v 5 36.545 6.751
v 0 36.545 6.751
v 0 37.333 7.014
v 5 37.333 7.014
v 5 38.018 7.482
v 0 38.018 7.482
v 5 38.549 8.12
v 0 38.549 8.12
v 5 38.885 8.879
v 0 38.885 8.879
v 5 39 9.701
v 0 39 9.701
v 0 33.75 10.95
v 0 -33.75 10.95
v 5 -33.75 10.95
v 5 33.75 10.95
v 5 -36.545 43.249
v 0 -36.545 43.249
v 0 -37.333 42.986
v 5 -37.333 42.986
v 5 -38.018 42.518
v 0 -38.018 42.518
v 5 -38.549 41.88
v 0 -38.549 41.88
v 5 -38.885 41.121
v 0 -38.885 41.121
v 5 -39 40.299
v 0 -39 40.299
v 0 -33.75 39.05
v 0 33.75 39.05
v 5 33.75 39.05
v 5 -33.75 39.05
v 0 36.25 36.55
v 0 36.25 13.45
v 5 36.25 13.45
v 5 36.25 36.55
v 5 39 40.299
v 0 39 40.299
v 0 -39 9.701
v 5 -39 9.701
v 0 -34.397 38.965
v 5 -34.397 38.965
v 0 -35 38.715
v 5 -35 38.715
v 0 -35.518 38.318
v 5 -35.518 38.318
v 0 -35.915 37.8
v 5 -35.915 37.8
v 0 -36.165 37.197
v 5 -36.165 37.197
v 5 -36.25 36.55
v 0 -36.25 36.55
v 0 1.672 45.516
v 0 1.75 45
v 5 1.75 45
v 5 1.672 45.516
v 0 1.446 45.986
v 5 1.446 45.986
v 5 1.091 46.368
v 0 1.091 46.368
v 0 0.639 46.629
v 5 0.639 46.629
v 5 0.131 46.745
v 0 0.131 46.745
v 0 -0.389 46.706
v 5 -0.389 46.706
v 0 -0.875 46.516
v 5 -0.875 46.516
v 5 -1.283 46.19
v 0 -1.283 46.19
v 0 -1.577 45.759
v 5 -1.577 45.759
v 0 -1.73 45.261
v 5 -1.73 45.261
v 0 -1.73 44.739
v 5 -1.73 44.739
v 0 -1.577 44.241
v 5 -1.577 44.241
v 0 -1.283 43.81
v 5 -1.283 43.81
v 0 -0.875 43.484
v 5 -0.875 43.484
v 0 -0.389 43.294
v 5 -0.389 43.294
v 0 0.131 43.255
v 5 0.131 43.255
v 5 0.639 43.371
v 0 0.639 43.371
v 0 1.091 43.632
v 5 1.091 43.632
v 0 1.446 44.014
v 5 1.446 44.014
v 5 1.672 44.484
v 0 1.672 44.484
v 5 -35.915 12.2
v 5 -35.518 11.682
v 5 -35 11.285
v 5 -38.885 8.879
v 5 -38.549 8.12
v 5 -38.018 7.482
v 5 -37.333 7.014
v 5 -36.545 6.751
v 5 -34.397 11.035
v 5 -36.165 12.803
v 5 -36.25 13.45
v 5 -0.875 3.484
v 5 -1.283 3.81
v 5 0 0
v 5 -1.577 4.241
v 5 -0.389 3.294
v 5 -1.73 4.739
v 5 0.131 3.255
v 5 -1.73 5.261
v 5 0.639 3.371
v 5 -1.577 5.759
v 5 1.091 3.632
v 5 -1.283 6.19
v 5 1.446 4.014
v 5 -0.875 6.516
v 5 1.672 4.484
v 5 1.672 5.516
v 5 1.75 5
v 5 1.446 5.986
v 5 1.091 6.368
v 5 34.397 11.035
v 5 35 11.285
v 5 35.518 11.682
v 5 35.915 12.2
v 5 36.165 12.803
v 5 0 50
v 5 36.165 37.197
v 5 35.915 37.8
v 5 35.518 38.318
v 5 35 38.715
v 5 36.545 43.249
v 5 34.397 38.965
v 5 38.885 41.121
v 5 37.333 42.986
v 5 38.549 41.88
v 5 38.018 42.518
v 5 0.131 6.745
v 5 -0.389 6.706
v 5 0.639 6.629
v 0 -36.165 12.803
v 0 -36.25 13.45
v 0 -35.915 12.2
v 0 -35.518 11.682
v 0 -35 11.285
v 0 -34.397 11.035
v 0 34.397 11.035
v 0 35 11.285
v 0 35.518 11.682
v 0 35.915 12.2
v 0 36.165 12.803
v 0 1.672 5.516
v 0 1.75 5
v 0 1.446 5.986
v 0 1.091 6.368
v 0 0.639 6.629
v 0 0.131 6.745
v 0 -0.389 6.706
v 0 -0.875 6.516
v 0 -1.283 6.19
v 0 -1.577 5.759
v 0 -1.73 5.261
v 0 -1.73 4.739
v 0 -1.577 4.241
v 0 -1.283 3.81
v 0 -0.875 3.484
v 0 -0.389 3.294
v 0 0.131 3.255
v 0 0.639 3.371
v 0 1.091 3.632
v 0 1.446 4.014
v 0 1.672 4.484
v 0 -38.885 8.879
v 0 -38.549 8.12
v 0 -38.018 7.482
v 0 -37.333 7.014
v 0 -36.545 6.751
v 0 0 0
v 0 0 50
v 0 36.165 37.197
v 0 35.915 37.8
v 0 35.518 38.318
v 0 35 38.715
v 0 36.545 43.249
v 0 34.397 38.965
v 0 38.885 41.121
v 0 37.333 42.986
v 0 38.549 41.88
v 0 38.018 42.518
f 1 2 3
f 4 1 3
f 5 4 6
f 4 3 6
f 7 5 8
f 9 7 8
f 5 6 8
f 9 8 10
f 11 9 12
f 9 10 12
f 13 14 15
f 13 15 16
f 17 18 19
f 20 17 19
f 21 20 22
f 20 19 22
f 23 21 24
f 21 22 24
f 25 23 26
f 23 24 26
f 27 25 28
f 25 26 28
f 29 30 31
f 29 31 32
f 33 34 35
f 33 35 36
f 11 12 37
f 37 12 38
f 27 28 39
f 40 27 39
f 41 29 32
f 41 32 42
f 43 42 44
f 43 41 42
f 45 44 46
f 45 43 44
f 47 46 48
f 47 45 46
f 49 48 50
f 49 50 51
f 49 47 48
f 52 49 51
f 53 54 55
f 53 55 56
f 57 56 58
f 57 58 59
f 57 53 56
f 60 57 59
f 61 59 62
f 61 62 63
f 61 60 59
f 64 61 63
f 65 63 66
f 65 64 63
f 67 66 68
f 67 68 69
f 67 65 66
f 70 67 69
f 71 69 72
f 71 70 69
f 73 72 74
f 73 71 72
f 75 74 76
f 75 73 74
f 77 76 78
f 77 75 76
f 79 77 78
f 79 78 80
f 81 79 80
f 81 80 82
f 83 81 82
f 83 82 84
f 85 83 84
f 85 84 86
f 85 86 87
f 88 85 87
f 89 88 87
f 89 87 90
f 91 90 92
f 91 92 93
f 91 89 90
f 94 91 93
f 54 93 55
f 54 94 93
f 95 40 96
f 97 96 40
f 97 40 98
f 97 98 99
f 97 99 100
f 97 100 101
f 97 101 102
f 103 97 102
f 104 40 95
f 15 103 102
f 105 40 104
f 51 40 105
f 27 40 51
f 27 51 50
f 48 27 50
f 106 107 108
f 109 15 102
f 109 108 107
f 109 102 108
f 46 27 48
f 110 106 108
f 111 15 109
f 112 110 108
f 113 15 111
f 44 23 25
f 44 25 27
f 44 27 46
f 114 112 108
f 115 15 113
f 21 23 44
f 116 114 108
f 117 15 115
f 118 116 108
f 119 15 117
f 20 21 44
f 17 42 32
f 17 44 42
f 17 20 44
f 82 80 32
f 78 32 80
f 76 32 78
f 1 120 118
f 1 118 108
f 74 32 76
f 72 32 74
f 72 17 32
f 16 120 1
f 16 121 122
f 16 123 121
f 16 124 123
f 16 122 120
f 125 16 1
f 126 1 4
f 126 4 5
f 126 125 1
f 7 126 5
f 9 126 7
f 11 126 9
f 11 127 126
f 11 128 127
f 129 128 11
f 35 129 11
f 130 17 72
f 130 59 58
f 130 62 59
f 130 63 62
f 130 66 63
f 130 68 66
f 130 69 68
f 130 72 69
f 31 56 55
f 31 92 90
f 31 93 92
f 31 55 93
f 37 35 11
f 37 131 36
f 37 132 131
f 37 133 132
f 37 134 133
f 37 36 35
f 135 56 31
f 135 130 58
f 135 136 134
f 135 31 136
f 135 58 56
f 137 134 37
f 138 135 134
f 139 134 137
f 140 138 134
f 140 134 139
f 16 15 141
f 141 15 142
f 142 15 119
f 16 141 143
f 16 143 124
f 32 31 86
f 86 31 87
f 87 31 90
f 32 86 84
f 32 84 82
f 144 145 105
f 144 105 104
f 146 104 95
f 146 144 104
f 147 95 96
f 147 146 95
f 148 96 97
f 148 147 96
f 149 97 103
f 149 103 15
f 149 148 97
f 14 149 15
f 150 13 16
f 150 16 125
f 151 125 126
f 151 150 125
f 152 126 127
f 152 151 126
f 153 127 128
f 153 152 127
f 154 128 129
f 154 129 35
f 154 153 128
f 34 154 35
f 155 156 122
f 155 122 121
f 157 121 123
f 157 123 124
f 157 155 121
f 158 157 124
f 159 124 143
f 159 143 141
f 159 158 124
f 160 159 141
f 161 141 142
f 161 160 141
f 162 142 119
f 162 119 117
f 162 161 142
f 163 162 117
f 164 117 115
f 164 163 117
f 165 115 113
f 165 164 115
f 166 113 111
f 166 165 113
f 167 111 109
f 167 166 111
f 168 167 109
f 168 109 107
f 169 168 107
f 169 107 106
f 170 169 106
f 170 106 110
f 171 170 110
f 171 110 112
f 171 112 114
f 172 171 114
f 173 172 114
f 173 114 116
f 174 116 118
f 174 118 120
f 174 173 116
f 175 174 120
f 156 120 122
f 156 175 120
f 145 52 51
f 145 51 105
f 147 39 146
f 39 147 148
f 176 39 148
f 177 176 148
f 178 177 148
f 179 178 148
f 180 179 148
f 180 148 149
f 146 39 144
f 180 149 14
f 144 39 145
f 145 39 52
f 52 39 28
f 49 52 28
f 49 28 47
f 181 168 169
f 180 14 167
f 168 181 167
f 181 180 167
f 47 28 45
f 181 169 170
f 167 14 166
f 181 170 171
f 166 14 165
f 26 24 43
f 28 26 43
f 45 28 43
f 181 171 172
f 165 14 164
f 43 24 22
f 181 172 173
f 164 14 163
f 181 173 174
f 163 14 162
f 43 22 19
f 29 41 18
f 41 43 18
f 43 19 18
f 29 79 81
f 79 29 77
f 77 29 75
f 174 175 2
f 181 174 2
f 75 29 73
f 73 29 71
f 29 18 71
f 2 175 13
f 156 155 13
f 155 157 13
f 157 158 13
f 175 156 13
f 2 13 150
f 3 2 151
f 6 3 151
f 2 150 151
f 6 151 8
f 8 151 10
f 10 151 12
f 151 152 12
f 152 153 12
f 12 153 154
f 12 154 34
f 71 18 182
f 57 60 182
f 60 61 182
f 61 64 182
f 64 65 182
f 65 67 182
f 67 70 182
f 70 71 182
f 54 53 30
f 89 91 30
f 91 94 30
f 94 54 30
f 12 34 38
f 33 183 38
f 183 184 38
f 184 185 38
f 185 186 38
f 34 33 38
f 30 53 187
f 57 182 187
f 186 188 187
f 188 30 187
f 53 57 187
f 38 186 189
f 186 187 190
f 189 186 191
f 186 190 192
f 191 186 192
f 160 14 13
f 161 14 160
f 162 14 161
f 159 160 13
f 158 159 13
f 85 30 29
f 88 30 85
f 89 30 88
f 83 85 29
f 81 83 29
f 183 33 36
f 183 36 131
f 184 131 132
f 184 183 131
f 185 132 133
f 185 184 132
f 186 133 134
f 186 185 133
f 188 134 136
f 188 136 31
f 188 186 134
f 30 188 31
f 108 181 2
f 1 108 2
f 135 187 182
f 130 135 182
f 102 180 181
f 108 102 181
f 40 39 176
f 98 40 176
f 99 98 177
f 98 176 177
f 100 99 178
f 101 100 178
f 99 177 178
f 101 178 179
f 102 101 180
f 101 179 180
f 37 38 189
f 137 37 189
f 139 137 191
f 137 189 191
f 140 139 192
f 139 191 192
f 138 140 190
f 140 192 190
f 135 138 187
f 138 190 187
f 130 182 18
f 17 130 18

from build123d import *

# Parameters (mm, degrees)
PAD_DEPTH    = 5
SKETCH_R     = 1.75
POCKET_DEPTH = 5


with BuildPart() as part:
    # Sketch001 → Pad (new body)
    with BuildSketch(Plane.YZ):
        with BuildLine():
            Line((39, 9.701271), (39, 40.298729))
            ThreePointArc((39, 40.298729), (38.305966, 42.217718), (36.544988, 43.248811))
            Line((36.544988, 43.248811), (0, 50))
            Line((0, 50), (-36.544988, 43.248811))
            ThreePointArc((-36.544988, 43.248811), (-38.305966, 42.217718), (-39, 40.298729))
            Line((-39, 40.298729), (-39, 9.701271))
            ThreePointArc((-39, 9.701271), (-38.305966, 7.782282), (-36.544988, 6.751189))
            Line((-36.544988, 6.751189), (0, 0))
            Line((0, 0), (36.544988, 6.751189))
            ThreePointArc((36.544988, 6.751189), (38.305966, 7.782282), (39, 9.701271))
        make_face()
    extrude(amount=PAD_DEPTH)

    # Sketch → Pocket (cut)
    with BuildSketch(Plane.YZ):
        with Locations((0, 45)):
            Circle(SKETCH_R)
        with Locations((0, 5)):
            Circle(SKETCH_R)
        with BuildLine():
            Line((-33.75, 10.95), (33.75, 10.95))
            ThreePointArc((33.75, 10.95), (35.517767, 11.682233), (36.25, 13.45))
            Line((36.25, 13.45), (36.25, 36.55))
            ThreePointArc((36.25, 36.55), (35.517767, 38.317767), (33.75, 39.05))
            Line((33.75, 39.05), (-33.75, 39.05))
            ThreePointArc((-33.75, 39.05), (-35.517767, 38.317767), (-36.25, 36.55))
            Line((-36.25, 36.55), (-36.25, 13.45))
            ThreePointArc((-36.25, 13.45), (-35.517767, 11.682233), (-33.75, 10.95))
        make_face()
    extrude(amount=POCKET_DEPTH, mode=Mode.SUBTRACT)


solid = part.part
